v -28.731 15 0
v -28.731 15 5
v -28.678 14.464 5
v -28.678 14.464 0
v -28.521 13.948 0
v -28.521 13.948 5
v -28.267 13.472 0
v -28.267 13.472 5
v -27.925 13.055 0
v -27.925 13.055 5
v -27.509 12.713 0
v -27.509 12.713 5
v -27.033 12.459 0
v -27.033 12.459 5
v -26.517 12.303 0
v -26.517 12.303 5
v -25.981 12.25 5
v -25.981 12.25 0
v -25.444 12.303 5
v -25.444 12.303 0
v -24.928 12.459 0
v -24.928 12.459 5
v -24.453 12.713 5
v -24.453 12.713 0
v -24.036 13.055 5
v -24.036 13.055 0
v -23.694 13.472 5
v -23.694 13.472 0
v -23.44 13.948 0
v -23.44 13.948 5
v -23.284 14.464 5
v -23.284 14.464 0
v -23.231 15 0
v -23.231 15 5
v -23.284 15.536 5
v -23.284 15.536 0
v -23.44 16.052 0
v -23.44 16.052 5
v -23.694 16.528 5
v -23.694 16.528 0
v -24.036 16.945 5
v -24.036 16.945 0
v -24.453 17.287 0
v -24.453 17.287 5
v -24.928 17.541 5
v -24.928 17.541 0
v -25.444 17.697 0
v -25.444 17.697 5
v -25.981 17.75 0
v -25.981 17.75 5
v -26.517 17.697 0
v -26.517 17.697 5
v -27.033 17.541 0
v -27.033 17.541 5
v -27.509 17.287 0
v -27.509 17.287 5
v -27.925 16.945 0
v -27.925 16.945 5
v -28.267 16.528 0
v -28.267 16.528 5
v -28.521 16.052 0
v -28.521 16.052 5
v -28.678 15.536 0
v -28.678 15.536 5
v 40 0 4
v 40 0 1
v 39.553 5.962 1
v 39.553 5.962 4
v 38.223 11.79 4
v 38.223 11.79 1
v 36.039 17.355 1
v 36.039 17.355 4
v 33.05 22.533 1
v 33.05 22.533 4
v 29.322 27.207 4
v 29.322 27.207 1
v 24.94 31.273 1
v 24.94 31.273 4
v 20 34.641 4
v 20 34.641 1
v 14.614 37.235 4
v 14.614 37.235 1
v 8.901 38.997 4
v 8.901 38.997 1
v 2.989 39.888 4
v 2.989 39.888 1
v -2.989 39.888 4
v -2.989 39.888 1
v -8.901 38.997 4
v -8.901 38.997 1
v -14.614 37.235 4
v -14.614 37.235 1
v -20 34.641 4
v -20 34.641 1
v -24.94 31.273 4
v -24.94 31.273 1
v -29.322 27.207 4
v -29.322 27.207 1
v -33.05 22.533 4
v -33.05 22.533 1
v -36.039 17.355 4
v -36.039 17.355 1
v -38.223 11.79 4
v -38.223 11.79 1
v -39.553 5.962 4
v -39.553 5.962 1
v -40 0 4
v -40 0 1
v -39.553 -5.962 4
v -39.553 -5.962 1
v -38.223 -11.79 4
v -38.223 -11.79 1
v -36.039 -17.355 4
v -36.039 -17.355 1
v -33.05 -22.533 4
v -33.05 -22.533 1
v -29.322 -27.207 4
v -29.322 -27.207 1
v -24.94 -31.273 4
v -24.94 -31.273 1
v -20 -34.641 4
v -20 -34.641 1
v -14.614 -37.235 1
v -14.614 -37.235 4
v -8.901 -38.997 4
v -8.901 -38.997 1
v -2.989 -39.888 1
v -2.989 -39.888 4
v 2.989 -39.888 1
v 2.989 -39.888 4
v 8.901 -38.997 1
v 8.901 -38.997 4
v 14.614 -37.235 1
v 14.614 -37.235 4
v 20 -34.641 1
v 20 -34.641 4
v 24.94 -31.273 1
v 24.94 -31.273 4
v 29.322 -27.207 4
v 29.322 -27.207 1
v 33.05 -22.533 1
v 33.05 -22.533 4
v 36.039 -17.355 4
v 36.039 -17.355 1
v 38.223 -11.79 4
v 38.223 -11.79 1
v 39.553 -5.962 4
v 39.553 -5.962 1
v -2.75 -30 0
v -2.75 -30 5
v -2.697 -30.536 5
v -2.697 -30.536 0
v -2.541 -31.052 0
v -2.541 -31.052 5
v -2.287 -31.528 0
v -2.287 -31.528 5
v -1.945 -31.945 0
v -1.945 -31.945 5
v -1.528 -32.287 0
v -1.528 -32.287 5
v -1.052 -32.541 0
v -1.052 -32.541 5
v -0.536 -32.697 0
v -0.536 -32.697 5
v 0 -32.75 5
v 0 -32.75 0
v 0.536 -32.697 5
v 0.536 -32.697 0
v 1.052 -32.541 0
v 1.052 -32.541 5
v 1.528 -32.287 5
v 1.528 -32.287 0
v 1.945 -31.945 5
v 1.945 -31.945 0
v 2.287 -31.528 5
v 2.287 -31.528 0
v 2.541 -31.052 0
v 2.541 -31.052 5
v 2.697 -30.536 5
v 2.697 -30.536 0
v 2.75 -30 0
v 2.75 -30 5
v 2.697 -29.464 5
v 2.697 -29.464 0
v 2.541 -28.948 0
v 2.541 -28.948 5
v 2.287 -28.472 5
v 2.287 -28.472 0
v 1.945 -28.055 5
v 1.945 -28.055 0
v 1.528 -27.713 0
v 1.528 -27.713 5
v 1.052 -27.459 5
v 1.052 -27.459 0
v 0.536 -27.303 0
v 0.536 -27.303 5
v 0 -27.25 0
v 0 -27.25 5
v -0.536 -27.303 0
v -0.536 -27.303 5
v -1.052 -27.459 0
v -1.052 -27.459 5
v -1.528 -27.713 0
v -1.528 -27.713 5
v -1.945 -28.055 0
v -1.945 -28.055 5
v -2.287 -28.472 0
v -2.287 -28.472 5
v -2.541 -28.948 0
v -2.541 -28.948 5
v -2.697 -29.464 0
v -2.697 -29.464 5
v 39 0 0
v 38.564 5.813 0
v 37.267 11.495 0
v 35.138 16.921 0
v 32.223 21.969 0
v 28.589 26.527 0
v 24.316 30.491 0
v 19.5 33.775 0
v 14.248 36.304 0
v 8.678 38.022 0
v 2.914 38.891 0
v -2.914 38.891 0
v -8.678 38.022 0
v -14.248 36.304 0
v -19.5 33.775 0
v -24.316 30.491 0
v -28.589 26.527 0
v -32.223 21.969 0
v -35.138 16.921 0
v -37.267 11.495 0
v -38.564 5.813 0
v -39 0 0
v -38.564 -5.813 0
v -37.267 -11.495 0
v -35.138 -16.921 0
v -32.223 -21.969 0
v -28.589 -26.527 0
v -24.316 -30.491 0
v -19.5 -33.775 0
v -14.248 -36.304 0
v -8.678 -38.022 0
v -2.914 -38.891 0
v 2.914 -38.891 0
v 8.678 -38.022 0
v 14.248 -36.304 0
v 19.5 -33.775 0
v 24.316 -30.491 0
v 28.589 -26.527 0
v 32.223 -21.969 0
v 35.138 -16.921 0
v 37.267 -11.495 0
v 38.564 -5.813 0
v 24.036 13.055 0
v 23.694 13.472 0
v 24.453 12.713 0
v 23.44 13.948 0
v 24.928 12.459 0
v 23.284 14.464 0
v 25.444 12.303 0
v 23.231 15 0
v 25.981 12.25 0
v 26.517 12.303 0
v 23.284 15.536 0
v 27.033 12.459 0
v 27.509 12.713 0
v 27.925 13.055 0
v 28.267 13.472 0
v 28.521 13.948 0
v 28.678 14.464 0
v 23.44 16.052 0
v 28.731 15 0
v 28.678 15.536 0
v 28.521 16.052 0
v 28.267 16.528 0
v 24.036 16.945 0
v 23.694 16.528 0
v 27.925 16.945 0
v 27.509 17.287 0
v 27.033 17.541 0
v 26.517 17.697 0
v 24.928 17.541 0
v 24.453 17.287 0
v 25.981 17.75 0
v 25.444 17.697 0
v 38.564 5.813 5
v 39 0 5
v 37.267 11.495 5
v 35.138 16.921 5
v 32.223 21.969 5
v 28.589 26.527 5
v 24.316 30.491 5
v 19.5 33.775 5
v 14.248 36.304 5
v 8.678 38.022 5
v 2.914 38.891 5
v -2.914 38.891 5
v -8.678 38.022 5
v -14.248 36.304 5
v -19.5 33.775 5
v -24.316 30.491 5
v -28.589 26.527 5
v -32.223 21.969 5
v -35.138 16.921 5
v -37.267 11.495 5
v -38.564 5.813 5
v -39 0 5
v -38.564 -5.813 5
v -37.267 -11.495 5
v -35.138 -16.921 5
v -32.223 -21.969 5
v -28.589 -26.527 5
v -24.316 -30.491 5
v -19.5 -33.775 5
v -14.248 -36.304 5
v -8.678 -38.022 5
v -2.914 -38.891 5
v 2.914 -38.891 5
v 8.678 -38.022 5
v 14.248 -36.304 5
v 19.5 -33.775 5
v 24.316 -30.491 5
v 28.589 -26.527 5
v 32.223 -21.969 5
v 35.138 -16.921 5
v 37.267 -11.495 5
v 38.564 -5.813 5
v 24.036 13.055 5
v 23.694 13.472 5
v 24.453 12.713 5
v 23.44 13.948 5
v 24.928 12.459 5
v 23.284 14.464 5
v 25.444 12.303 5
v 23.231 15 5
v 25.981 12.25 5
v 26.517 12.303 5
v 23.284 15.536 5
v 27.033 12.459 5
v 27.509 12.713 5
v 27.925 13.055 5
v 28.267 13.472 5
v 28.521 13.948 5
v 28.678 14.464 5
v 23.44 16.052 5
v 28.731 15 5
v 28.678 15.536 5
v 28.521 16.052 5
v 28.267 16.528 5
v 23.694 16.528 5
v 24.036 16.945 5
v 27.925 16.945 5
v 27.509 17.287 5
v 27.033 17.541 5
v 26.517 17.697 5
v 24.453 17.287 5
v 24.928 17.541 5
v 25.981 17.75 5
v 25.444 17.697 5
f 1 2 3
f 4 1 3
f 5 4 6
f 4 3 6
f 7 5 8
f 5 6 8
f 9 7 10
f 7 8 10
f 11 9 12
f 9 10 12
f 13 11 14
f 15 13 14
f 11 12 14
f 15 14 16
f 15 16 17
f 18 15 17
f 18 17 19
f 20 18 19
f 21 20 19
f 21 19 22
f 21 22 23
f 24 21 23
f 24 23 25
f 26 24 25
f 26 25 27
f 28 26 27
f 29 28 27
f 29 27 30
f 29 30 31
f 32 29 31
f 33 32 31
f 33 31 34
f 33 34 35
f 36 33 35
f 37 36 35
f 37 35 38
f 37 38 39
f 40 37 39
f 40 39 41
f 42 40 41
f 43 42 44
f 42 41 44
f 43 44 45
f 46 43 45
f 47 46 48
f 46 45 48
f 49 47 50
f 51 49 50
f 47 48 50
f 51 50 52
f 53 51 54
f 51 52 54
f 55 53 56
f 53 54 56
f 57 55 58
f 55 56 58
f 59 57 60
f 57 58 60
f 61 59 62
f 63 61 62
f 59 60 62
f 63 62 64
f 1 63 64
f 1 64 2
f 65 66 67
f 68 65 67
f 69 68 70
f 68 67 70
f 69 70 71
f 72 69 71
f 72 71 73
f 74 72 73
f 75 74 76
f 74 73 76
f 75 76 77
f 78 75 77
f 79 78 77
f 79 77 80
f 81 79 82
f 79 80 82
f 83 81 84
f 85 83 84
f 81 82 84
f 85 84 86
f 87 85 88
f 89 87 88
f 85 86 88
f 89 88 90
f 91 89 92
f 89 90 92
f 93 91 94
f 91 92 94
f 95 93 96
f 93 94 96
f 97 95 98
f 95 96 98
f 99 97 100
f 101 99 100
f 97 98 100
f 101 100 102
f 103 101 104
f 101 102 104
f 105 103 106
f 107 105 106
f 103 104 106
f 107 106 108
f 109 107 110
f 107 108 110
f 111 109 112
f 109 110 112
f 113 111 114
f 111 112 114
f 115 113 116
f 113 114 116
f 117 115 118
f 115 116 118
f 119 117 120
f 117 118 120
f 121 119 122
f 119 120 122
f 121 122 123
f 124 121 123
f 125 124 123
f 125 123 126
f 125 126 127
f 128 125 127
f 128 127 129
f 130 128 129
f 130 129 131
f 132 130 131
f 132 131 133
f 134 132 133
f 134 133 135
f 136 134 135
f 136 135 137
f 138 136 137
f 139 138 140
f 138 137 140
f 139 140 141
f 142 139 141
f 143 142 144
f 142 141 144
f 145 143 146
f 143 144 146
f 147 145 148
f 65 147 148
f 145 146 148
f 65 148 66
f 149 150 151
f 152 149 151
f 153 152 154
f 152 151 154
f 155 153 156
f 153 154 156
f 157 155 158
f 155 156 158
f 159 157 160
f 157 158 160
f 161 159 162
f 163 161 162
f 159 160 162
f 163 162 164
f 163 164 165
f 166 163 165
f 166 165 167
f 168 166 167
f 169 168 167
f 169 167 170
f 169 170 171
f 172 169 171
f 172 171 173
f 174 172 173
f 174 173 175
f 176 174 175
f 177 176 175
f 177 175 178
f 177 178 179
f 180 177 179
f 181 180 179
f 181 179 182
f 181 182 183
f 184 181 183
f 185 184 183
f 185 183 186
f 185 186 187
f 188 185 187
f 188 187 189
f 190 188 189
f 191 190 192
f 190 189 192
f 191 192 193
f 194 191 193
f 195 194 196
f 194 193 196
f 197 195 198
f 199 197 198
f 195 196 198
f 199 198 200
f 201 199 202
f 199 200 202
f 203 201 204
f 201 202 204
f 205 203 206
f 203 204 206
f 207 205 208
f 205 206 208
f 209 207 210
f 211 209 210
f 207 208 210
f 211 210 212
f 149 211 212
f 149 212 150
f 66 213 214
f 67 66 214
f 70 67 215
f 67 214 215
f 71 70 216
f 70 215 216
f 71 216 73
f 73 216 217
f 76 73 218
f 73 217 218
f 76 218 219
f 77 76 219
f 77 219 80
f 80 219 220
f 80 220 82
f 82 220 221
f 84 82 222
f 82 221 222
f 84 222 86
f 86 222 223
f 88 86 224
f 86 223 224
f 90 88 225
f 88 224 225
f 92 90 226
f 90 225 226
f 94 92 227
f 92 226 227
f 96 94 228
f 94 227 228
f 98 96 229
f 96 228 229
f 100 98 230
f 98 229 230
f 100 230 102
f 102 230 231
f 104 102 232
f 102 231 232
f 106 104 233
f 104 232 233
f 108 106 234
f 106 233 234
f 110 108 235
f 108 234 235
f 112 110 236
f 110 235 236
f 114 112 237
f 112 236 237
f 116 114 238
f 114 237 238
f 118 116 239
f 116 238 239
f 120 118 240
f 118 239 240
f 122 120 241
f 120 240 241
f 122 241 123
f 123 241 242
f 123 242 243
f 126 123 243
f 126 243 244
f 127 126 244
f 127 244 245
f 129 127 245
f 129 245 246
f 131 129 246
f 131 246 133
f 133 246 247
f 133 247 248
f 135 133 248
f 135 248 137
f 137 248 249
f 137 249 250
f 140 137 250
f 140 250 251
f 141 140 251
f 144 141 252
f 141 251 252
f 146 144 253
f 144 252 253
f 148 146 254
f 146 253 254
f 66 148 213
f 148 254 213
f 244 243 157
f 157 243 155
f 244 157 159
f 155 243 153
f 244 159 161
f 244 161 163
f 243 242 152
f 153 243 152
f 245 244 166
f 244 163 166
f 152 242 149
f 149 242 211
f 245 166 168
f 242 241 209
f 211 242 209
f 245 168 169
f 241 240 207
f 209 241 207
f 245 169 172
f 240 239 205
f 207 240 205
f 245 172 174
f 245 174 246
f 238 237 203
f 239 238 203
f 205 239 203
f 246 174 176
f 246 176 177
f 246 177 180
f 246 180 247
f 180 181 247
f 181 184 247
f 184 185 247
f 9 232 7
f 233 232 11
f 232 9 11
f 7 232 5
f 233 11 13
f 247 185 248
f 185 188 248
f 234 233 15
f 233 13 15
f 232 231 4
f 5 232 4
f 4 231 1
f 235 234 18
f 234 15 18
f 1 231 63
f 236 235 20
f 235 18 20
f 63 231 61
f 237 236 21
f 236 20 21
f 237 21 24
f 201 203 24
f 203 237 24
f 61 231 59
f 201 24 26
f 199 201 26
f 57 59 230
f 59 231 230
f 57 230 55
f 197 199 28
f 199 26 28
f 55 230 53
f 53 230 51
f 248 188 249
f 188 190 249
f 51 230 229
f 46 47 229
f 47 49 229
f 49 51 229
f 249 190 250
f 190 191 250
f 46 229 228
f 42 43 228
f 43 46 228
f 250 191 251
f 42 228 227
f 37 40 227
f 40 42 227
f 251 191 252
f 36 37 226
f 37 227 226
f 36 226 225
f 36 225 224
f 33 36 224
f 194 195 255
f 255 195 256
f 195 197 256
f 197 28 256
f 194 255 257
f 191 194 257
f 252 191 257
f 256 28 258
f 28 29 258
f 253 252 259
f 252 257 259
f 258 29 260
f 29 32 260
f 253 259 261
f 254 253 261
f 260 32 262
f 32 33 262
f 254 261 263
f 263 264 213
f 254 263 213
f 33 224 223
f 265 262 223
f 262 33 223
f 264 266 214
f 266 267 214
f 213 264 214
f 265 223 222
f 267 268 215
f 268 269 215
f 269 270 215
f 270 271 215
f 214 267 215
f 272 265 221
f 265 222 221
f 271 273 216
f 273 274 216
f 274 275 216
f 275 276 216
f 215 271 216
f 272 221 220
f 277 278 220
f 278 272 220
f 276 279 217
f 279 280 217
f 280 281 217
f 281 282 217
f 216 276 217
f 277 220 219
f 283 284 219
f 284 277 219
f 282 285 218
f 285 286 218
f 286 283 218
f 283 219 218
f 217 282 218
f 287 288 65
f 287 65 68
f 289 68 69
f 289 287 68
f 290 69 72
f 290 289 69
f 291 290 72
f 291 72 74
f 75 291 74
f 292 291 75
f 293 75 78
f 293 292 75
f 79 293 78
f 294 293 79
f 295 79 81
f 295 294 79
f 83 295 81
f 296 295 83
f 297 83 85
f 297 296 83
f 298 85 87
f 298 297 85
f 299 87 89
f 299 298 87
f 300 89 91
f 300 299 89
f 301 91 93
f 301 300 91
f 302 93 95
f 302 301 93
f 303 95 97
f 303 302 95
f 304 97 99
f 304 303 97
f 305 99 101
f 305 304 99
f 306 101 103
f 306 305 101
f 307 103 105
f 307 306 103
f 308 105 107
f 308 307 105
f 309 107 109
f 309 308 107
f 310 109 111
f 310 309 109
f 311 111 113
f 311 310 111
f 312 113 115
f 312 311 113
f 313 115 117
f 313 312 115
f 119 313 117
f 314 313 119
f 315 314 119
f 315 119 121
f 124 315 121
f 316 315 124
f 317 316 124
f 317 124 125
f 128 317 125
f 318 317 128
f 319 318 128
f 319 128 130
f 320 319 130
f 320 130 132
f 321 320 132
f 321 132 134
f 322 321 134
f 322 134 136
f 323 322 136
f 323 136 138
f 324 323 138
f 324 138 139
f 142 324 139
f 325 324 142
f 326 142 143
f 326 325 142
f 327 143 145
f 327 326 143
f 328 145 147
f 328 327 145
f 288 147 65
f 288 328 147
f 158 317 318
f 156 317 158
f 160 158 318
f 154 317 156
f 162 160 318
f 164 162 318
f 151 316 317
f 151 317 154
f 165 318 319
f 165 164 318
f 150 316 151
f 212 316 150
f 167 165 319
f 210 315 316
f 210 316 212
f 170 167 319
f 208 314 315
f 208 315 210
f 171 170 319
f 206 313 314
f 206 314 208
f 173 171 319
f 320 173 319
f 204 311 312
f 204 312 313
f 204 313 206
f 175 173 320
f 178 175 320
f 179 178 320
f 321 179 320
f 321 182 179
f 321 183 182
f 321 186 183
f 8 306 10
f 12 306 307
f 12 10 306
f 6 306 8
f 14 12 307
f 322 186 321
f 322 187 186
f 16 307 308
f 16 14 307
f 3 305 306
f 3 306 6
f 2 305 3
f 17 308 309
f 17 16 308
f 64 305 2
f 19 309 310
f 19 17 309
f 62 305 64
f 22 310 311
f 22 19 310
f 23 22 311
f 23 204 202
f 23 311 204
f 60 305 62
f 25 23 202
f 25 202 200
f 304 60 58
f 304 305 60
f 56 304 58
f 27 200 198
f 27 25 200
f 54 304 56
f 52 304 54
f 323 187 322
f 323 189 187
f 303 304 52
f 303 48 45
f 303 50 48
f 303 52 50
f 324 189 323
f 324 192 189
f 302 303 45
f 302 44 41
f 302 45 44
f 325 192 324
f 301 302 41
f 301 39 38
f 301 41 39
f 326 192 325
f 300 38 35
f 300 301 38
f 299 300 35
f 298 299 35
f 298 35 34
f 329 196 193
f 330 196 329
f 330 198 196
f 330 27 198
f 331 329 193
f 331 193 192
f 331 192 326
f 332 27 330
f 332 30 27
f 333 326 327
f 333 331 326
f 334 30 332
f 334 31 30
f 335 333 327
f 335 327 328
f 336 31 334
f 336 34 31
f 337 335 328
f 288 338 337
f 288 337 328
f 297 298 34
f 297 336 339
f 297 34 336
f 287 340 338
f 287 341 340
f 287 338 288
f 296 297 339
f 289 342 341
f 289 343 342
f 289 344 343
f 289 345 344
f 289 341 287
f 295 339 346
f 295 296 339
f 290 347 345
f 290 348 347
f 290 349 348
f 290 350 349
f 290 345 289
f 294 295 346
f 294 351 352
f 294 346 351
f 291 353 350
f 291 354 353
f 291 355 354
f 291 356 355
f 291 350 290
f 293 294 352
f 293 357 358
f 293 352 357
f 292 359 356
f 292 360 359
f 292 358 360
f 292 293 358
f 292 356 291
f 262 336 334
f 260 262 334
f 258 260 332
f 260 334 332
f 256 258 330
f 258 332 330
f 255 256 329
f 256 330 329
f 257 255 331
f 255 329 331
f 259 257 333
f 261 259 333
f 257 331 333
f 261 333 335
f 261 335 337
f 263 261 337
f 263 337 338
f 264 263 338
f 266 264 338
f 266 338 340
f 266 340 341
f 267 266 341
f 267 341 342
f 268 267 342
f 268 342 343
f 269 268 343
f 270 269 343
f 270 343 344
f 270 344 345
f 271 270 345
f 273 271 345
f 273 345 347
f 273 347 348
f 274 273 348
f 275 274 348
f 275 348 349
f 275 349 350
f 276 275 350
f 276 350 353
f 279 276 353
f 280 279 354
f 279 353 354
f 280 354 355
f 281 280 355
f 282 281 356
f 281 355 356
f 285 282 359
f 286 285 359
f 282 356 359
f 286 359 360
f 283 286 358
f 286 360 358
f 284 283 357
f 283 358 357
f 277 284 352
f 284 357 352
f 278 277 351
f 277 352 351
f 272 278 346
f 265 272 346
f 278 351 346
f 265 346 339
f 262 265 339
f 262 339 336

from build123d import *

# Parameters (mm, degrees)
F0_R     = 40
F1_DEPTH = 5
F3_D     = 5.5
F4_SIZE  = 1


with BuildPart() as f1:
    # F0 (on Top) → F1 (new body)
    with BuildSketch(Plane.XY):
        Circle(F0_R)
    extrude(amount=F1_DEPTH)

    # F3 (through all)
    with Locations(Plane(origin=(0, 0, 0), x_dir=(1, 0, 0), z_dir=(0, 0, -1))):
        with Locations((0, 30), (25.980762, -15), (-25.980762, -15)):
            Hole(F3_D / 2)

    # F4
    f4_edges = [f1.edges().sort_by_distance(p)[0] for p in [
        (-40, 0, 5),
        (-40, 0, 0),
    ]]
    chamfer(f4_edges, length=F4_SIZE)


solid = f1.part
